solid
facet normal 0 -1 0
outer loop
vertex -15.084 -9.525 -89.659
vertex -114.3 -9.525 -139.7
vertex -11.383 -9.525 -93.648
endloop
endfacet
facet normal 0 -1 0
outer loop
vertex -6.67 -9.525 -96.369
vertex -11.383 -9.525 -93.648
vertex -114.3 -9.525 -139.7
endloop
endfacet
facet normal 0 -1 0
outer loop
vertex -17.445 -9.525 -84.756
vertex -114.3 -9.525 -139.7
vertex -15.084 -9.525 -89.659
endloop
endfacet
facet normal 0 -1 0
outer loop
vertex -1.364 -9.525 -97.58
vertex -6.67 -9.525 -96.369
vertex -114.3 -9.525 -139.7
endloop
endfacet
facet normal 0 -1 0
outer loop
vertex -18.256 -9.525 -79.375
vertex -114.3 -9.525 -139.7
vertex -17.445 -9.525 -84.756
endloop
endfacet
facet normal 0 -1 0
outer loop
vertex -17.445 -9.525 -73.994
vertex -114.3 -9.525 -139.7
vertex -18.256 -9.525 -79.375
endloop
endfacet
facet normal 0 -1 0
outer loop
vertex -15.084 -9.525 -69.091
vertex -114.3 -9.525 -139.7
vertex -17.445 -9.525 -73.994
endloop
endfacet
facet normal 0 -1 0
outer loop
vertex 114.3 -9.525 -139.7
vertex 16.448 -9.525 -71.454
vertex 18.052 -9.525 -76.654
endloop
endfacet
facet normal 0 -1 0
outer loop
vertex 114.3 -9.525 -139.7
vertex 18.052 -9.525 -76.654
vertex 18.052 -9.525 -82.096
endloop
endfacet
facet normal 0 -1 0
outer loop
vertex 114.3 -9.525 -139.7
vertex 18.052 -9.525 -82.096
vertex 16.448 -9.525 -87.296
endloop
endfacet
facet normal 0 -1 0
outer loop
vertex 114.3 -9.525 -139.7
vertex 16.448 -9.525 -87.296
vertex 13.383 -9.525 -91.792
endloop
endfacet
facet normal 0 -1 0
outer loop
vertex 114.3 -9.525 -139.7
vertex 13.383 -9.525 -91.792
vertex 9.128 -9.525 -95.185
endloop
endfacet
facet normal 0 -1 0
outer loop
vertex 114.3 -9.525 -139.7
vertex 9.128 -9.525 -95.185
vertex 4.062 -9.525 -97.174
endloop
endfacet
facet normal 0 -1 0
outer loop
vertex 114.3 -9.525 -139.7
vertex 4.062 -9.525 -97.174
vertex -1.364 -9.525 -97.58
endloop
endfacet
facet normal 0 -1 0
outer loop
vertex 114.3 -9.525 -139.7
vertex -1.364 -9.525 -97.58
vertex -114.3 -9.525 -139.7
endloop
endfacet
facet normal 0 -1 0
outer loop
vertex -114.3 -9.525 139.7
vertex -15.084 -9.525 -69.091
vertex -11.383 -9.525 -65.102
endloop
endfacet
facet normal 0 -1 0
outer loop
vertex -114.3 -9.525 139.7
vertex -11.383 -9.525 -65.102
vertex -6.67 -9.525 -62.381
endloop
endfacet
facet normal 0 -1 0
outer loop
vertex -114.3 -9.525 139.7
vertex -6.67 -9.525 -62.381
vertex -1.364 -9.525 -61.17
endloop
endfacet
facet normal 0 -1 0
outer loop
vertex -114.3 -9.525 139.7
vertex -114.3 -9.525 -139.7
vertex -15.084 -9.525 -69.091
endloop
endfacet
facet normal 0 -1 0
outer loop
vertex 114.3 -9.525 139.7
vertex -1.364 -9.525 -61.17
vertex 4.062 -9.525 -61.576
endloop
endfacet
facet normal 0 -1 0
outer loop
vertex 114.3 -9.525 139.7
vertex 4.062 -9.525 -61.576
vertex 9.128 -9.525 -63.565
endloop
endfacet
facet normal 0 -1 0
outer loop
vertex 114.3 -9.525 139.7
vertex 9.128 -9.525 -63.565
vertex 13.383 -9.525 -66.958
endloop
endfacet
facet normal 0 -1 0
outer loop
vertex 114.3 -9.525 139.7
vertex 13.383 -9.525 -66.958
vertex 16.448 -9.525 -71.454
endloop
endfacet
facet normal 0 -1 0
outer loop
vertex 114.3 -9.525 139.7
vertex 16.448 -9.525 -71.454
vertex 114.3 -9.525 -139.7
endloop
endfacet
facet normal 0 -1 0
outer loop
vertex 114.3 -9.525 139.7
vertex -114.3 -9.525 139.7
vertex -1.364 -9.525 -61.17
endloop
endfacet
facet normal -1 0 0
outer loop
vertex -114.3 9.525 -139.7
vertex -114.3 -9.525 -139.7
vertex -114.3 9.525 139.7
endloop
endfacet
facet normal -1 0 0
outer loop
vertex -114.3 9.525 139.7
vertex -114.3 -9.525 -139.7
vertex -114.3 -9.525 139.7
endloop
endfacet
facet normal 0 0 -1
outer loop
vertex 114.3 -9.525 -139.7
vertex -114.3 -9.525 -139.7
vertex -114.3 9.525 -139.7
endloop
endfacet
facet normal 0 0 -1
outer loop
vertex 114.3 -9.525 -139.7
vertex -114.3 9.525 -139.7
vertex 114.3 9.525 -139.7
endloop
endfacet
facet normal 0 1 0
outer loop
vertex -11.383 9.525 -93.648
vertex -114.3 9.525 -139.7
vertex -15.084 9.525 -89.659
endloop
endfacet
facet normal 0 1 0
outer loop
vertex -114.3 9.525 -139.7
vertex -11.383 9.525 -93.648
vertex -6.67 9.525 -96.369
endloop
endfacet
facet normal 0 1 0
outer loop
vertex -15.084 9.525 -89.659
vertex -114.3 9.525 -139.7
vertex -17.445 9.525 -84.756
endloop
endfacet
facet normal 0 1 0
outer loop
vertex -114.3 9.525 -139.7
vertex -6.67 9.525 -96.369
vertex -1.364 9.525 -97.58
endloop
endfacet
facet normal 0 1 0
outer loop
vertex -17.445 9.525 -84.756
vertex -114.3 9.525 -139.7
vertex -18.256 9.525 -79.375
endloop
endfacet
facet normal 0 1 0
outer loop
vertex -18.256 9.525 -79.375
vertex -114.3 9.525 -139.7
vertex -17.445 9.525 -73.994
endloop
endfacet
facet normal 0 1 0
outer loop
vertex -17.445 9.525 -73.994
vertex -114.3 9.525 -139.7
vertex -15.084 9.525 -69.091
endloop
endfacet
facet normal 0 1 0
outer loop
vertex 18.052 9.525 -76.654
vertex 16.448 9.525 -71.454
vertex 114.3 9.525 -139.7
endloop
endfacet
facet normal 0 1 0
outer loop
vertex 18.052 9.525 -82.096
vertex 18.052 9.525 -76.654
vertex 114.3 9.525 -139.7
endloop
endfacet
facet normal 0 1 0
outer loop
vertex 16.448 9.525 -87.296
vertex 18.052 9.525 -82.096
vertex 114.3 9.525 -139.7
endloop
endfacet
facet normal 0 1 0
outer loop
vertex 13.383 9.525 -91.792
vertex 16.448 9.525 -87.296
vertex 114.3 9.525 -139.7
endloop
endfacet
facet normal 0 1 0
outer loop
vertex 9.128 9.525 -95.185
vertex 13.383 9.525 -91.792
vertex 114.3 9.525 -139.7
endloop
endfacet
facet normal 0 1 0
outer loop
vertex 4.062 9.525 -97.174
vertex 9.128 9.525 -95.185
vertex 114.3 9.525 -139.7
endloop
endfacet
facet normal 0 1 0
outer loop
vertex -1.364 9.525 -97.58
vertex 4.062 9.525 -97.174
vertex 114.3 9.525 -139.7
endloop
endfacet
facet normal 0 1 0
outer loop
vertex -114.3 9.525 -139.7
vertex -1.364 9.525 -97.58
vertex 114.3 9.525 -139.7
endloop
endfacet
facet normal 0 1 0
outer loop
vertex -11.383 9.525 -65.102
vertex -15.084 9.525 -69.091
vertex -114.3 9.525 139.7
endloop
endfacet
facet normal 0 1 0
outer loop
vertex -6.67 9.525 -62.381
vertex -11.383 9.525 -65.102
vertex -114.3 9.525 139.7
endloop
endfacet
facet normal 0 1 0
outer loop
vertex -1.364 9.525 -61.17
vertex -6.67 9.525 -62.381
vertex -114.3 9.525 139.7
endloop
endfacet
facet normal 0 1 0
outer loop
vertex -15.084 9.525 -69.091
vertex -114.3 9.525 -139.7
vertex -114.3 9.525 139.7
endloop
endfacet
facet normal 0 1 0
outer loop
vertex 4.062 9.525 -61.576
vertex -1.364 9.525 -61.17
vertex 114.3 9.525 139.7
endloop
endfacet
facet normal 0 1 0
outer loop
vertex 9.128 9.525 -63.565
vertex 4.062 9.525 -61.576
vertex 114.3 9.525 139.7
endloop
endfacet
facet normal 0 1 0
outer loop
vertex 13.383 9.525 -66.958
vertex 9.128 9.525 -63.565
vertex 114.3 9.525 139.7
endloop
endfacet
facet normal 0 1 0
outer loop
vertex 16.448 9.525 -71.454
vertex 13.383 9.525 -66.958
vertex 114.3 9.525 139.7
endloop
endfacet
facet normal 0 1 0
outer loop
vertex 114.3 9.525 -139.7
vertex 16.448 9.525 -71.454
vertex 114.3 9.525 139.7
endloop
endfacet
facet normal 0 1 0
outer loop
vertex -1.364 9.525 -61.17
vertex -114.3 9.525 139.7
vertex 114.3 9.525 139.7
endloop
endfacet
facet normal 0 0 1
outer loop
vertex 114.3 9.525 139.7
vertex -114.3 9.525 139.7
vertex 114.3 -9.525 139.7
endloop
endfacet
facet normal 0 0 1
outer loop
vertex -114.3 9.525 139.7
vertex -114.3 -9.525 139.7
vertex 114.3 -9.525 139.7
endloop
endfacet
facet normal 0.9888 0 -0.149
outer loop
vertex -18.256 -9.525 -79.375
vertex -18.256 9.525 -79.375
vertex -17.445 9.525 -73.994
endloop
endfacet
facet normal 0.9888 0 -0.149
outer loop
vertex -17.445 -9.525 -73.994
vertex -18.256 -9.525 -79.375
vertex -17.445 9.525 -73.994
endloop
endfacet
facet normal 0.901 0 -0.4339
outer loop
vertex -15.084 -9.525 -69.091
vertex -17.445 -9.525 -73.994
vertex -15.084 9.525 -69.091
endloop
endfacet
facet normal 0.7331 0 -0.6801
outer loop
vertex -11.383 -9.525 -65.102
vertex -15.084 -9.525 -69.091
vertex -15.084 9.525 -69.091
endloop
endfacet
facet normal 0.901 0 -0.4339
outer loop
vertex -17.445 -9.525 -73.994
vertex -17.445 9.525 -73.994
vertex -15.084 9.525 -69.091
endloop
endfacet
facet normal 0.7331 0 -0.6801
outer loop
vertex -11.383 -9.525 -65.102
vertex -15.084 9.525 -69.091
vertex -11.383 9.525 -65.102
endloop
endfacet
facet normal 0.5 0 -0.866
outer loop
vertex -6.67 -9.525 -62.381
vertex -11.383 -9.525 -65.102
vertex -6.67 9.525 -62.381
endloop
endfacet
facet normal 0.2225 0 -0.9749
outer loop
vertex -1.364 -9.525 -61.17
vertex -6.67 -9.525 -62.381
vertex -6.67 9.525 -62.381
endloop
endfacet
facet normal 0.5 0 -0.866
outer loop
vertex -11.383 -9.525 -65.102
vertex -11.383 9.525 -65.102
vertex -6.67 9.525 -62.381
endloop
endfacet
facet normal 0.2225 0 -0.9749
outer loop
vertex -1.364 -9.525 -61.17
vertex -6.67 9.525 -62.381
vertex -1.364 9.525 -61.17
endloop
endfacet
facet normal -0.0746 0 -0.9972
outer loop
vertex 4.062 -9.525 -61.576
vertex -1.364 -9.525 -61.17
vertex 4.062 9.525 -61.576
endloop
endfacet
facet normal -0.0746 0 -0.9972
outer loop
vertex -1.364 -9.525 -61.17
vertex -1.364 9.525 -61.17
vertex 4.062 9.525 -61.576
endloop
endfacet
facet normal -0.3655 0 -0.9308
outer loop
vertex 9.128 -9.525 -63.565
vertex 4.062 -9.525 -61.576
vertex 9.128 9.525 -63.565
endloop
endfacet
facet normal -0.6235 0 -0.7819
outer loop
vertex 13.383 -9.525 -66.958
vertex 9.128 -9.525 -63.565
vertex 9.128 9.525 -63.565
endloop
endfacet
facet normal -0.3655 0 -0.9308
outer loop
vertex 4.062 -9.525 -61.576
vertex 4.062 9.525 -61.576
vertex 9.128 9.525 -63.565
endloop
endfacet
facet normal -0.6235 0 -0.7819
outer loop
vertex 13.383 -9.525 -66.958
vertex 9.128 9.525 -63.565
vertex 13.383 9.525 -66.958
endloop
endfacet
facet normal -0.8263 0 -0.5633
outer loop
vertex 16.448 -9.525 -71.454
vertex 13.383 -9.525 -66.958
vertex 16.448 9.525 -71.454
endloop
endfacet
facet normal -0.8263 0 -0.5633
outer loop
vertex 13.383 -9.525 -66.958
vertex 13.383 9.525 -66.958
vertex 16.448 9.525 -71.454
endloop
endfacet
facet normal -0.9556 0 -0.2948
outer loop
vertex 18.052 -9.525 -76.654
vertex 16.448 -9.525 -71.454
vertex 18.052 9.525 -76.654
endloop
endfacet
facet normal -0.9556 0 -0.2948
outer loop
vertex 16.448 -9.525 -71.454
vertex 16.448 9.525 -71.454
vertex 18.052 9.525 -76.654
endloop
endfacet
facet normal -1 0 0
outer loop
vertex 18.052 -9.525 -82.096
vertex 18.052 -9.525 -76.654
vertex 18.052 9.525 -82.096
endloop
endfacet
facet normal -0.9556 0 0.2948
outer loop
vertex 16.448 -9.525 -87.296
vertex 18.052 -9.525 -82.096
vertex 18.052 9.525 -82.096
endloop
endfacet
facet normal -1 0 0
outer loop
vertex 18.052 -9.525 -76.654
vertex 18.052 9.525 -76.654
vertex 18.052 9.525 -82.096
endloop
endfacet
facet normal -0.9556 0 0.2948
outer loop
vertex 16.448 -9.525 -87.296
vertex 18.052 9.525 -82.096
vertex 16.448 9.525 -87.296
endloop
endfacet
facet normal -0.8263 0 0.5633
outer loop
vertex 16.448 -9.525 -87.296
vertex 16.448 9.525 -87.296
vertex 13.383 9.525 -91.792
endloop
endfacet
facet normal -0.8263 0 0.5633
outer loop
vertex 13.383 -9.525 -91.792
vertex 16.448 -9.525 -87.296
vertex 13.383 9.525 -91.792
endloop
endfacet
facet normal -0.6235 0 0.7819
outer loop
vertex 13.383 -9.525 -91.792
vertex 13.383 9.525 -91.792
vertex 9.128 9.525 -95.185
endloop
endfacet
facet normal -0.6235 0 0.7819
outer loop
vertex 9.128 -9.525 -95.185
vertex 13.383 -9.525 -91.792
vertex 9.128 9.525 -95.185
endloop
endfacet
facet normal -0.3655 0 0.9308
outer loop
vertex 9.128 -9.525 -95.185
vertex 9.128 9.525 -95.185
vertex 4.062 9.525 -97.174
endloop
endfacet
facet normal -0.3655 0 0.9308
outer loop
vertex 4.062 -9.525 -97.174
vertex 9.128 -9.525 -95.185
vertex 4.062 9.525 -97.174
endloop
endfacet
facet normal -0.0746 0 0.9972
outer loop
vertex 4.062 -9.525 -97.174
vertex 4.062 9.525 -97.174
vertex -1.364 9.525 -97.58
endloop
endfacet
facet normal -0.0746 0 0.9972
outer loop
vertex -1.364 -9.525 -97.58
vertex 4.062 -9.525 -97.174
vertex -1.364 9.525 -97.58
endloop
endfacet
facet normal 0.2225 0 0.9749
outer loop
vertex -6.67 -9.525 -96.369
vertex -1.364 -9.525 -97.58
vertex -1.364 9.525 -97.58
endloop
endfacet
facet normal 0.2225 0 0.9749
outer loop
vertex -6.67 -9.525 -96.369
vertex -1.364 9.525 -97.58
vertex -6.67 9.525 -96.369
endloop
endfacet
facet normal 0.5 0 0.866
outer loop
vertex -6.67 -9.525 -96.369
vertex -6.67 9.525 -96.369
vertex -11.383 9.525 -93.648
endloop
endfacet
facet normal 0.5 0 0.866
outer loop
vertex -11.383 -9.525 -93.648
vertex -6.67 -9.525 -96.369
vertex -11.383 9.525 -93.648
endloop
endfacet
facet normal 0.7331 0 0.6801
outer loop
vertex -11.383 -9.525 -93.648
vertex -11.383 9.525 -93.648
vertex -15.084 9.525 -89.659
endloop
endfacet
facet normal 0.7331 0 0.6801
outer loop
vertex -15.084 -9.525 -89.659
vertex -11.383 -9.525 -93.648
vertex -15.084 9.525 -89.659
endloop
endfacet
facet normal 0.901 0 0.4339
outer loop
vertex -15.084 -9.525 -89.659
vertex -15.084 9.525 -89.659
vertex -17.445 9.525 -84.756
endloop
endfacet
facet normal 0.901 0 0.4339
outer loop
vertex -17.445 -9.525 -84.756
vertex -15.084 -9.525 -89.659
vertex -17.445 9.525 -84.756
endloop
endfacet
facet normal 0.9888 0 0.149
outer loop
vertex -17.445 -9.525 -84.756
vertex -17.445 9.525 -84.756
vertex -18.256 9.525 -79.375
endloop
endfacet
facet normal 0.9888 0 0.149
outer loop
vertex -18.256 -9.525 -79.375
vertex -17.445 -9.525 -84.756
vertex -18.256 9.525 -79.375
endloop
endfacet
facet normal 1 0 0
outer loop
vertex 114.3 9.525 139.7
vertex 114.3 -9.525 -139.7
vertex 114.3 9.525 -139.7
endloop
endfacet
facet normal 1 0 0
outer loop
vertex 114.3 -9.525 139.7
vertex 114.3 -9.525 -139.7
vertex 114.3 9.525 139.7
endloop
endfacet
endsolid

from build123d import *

# Parameters (mm, degrees)
F0_W     = 228.6
F0_H     = 279.4
F1_DEPTH = 9.525
F3_D     = 36.5125


with BuildPart() as f1:
    # F0 (on Front) → F1 (new body, symmetric)
    with BuildSketch(Plane.XZ):
        Rectangle(F0_W, F0_H)
    extrude(amount=F1_DEPTH, both=True)

    # F3 (through all)
    with Locations(Plane.XZ.offset(9.525)):
        with Locations((0, -79.375)):
            Hole(F3_D / 2)


solid = f1.part
